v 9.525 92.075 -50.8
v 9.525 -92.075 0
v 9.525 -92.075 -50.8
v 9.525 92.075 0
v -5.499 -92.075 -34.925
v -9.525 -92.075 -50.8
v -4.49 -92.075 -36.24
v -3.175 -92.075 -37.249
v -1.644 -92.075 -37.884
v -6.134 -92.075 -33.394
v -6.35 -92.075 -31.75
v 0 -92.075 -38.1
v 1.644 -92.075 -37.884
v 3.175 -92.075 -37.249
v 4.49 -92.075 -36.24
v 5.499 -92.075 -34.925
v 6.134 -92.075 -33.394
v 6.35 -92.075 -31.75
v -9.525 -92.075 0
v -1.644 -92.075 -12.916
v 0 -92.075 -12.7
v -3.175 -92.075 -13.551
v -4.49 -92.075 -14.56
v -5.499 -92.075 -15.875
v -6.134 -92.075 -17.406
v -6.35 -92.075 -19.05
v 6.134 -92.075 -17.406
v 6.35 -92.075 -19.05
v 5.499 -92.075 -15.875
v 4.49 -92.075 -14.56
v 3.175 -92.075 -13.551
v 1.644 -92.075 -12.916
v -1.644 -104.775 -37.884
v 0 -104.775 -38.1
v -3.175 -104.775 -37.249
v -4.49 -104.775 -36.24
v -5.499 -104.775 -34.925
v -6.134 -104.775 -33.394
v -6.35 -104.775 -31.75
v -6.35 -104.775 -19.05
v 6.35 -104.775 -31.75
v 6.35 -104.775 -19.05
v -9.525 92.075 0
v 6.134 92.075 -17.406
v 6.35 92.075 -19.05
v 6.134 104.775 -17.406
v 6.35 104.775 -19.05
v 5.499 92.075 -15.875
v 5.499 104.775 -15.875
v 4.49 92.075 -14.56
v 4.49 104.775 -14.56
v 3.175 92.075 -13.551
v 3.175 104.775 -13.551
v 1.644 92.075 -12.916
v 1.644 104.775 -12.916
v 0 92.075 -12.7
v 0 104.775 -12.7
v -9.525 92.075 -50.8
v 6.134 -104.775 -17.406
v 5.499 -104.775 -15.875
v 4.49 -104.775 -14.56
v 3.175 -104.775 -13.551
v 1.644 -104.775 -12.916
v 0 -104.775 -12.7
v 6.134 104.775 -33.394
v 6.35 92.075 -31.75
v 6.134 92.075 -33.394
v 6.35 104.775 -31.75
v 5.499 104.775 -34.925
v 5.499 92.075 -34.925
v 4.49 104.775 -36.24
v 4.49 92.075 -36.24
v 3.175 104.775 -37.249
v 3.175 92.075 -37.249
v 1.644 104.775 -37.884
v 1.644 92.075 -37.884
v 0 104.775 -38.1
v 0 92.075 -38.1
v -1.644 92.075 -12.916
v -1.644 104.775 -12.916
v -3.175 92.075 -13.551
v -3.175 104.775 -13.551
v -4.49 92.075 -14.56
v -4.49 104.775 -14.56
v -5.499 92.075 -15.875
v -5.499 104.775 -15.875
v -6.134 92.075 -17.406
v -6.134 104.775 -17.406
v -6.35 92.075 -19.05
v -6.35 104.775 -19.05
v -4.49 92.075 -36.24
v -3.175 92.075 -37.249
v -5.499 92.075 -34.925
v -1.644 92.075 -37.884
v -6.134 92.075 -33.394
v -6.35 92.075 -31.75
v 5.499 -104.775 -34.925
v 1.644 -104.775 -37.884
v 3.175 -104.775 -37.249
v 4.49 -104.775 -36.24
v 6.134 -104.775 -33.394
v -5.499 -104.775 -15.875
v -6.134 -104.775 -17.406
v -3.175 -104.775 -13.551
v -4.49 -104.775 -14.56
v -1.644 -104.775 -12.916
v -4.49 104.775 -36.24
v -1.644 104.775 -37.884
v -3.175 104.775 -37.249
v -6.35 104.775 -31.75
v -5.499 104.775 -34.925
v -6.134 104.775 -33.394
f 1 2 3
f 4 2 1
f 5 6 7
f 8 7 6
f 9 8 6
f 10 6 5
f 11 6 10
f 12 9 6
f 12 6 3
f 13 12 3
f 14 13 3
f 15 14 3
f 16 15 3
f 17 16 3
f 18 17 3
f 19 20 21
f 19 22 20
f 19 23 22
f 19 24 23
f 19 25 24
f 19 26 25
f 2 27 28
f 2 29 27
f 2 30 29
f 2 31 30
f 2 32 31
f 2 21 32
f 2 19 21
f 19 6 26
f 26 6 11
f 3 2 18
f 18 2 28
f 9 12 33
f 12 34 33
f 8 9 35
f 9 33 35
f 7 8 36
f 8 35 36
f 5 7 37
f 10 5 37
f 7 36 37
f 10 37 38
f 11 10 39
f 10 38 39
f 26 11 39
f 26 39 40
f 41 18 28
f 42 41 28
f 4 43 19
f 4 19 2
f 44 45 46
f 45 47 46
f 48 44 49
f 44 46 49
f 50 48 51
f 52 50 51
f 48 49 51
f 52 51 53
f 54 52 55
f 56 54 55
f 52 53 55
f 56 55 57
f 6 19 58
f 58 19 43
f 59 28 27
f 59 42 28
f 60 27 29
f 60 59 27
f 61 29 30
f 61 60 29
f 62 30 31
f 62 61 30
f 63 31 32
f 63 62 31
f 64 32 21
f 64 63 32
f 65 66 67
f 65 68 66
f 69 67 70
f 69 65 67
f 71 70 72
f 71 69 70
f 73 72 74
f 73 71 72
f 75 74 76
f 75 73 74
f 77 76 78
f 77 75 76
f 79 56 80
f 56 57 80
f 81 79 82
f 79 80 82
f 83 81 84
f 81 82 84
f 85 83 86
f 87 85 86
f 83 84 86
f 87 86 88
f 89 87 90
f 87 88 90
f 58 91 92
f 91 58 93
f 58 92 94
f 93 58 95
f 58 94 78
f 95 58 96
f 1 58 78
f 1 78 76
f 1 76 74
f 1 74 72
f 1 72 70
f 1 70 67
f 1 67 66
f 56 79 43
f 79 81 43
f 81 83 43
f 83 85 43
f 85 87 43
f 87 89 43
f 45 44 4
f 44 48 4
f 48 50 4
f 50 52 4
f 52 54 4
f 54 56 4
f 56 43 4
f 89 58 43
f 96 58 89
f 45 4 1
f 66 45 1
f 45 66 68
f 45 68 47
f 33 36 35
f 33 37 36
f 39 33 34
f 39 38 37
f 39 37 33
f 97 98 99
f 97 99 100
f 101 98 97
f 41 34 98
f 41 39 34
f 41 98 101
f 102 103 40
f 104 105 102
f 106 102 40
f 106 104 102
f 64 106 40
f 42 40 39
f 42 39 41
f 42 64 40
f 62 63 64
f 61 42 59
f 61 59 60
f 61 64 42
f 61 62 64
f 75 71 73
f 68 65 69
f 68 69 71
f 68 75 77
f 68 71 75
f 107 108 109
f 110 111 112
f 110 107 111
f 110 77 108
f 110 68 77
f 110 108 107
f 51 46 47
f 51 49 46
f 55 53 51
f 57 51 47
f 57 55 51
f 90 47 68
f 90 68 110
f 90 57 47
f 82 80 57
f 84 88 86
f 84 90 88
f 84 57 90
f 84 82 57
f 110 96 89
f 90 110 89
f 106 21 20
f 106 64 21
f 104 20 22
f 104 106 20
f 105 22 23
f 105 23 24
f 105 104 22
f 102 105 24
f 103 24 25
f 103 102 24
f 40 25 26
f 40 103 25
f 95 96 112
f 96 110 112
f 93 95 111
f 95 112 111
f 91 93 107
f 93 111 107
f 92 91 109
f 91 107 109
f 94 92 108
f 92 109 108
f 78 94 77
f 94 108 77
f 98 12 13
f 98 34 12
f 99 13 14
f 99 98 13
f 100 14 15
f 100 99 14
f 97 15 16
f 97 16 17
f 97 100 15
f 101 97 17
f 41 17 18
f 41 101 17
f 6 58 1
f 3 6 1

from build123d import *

# Parameters (mm, degrees)
F0_W     = 19.05
F0_H     = 184.15
F1_DEPTH = 50.8
F2_W     = 12.7
F2_H     = 25.4
F3_DEPTH = 12.7
F4_W     = 12.7
F4_H     = 25.4
F5_DEPTH = 12.7
F6_R     = 6.34999


# Not quite as in the source:
# - a fillet or chamfer is up to 0.001 mm smaller than in the source, because OpenCascade refuses the exact size


with BuildPart() as f1:
    # F0 (on Top) → F1 (new body)
    with BuildSketch(Plane.XY):
        Rectangle(F0_W, F0_H)
    extrude(amount=-F1_DEPTH)

    # F2 (on face) → F3 (join)
    with BuildSketch(Plane.XZ.offset(92.075)):
        with Locations((0, -25.4)):
            Rectangle(F2_W, F2_H)
    extrude(amount=F3_DEPTH)

    # F4 (on face) → F5 (join)
    with BuildSketch(Plane(origin=(0, 92.075, 0), x_dir=(-1, 0, 0), z_dir=(0, 1, 0))):
        with Locations((0, -25.4)):
            Rectangle(F4_W, F4_H)
    extrude(amount=F5_DEPTH)

    # F6 (radius 6.35 in the source; OpenCascade refuses exactly that, so slightly less here)
    f6_edges = [f1.edges().sort_by_distance(p)[0] for p in [
        (6.35, 98.425, -12.7),
        (-6.35, 98.425, -12.7),
        (-6.35, 98.425, -38.1),
        (6.35, 98.425, -38.1),
        (-6.35, -98.425, -12.7),
        (6.35, -98.425, -12.7),
        (-6.35, -98.425, -38.1),
        (6.35, -98.425, -38.1),
    ]]
    fillet(f6_edges, radius=F6_R)


solid = f1.part
